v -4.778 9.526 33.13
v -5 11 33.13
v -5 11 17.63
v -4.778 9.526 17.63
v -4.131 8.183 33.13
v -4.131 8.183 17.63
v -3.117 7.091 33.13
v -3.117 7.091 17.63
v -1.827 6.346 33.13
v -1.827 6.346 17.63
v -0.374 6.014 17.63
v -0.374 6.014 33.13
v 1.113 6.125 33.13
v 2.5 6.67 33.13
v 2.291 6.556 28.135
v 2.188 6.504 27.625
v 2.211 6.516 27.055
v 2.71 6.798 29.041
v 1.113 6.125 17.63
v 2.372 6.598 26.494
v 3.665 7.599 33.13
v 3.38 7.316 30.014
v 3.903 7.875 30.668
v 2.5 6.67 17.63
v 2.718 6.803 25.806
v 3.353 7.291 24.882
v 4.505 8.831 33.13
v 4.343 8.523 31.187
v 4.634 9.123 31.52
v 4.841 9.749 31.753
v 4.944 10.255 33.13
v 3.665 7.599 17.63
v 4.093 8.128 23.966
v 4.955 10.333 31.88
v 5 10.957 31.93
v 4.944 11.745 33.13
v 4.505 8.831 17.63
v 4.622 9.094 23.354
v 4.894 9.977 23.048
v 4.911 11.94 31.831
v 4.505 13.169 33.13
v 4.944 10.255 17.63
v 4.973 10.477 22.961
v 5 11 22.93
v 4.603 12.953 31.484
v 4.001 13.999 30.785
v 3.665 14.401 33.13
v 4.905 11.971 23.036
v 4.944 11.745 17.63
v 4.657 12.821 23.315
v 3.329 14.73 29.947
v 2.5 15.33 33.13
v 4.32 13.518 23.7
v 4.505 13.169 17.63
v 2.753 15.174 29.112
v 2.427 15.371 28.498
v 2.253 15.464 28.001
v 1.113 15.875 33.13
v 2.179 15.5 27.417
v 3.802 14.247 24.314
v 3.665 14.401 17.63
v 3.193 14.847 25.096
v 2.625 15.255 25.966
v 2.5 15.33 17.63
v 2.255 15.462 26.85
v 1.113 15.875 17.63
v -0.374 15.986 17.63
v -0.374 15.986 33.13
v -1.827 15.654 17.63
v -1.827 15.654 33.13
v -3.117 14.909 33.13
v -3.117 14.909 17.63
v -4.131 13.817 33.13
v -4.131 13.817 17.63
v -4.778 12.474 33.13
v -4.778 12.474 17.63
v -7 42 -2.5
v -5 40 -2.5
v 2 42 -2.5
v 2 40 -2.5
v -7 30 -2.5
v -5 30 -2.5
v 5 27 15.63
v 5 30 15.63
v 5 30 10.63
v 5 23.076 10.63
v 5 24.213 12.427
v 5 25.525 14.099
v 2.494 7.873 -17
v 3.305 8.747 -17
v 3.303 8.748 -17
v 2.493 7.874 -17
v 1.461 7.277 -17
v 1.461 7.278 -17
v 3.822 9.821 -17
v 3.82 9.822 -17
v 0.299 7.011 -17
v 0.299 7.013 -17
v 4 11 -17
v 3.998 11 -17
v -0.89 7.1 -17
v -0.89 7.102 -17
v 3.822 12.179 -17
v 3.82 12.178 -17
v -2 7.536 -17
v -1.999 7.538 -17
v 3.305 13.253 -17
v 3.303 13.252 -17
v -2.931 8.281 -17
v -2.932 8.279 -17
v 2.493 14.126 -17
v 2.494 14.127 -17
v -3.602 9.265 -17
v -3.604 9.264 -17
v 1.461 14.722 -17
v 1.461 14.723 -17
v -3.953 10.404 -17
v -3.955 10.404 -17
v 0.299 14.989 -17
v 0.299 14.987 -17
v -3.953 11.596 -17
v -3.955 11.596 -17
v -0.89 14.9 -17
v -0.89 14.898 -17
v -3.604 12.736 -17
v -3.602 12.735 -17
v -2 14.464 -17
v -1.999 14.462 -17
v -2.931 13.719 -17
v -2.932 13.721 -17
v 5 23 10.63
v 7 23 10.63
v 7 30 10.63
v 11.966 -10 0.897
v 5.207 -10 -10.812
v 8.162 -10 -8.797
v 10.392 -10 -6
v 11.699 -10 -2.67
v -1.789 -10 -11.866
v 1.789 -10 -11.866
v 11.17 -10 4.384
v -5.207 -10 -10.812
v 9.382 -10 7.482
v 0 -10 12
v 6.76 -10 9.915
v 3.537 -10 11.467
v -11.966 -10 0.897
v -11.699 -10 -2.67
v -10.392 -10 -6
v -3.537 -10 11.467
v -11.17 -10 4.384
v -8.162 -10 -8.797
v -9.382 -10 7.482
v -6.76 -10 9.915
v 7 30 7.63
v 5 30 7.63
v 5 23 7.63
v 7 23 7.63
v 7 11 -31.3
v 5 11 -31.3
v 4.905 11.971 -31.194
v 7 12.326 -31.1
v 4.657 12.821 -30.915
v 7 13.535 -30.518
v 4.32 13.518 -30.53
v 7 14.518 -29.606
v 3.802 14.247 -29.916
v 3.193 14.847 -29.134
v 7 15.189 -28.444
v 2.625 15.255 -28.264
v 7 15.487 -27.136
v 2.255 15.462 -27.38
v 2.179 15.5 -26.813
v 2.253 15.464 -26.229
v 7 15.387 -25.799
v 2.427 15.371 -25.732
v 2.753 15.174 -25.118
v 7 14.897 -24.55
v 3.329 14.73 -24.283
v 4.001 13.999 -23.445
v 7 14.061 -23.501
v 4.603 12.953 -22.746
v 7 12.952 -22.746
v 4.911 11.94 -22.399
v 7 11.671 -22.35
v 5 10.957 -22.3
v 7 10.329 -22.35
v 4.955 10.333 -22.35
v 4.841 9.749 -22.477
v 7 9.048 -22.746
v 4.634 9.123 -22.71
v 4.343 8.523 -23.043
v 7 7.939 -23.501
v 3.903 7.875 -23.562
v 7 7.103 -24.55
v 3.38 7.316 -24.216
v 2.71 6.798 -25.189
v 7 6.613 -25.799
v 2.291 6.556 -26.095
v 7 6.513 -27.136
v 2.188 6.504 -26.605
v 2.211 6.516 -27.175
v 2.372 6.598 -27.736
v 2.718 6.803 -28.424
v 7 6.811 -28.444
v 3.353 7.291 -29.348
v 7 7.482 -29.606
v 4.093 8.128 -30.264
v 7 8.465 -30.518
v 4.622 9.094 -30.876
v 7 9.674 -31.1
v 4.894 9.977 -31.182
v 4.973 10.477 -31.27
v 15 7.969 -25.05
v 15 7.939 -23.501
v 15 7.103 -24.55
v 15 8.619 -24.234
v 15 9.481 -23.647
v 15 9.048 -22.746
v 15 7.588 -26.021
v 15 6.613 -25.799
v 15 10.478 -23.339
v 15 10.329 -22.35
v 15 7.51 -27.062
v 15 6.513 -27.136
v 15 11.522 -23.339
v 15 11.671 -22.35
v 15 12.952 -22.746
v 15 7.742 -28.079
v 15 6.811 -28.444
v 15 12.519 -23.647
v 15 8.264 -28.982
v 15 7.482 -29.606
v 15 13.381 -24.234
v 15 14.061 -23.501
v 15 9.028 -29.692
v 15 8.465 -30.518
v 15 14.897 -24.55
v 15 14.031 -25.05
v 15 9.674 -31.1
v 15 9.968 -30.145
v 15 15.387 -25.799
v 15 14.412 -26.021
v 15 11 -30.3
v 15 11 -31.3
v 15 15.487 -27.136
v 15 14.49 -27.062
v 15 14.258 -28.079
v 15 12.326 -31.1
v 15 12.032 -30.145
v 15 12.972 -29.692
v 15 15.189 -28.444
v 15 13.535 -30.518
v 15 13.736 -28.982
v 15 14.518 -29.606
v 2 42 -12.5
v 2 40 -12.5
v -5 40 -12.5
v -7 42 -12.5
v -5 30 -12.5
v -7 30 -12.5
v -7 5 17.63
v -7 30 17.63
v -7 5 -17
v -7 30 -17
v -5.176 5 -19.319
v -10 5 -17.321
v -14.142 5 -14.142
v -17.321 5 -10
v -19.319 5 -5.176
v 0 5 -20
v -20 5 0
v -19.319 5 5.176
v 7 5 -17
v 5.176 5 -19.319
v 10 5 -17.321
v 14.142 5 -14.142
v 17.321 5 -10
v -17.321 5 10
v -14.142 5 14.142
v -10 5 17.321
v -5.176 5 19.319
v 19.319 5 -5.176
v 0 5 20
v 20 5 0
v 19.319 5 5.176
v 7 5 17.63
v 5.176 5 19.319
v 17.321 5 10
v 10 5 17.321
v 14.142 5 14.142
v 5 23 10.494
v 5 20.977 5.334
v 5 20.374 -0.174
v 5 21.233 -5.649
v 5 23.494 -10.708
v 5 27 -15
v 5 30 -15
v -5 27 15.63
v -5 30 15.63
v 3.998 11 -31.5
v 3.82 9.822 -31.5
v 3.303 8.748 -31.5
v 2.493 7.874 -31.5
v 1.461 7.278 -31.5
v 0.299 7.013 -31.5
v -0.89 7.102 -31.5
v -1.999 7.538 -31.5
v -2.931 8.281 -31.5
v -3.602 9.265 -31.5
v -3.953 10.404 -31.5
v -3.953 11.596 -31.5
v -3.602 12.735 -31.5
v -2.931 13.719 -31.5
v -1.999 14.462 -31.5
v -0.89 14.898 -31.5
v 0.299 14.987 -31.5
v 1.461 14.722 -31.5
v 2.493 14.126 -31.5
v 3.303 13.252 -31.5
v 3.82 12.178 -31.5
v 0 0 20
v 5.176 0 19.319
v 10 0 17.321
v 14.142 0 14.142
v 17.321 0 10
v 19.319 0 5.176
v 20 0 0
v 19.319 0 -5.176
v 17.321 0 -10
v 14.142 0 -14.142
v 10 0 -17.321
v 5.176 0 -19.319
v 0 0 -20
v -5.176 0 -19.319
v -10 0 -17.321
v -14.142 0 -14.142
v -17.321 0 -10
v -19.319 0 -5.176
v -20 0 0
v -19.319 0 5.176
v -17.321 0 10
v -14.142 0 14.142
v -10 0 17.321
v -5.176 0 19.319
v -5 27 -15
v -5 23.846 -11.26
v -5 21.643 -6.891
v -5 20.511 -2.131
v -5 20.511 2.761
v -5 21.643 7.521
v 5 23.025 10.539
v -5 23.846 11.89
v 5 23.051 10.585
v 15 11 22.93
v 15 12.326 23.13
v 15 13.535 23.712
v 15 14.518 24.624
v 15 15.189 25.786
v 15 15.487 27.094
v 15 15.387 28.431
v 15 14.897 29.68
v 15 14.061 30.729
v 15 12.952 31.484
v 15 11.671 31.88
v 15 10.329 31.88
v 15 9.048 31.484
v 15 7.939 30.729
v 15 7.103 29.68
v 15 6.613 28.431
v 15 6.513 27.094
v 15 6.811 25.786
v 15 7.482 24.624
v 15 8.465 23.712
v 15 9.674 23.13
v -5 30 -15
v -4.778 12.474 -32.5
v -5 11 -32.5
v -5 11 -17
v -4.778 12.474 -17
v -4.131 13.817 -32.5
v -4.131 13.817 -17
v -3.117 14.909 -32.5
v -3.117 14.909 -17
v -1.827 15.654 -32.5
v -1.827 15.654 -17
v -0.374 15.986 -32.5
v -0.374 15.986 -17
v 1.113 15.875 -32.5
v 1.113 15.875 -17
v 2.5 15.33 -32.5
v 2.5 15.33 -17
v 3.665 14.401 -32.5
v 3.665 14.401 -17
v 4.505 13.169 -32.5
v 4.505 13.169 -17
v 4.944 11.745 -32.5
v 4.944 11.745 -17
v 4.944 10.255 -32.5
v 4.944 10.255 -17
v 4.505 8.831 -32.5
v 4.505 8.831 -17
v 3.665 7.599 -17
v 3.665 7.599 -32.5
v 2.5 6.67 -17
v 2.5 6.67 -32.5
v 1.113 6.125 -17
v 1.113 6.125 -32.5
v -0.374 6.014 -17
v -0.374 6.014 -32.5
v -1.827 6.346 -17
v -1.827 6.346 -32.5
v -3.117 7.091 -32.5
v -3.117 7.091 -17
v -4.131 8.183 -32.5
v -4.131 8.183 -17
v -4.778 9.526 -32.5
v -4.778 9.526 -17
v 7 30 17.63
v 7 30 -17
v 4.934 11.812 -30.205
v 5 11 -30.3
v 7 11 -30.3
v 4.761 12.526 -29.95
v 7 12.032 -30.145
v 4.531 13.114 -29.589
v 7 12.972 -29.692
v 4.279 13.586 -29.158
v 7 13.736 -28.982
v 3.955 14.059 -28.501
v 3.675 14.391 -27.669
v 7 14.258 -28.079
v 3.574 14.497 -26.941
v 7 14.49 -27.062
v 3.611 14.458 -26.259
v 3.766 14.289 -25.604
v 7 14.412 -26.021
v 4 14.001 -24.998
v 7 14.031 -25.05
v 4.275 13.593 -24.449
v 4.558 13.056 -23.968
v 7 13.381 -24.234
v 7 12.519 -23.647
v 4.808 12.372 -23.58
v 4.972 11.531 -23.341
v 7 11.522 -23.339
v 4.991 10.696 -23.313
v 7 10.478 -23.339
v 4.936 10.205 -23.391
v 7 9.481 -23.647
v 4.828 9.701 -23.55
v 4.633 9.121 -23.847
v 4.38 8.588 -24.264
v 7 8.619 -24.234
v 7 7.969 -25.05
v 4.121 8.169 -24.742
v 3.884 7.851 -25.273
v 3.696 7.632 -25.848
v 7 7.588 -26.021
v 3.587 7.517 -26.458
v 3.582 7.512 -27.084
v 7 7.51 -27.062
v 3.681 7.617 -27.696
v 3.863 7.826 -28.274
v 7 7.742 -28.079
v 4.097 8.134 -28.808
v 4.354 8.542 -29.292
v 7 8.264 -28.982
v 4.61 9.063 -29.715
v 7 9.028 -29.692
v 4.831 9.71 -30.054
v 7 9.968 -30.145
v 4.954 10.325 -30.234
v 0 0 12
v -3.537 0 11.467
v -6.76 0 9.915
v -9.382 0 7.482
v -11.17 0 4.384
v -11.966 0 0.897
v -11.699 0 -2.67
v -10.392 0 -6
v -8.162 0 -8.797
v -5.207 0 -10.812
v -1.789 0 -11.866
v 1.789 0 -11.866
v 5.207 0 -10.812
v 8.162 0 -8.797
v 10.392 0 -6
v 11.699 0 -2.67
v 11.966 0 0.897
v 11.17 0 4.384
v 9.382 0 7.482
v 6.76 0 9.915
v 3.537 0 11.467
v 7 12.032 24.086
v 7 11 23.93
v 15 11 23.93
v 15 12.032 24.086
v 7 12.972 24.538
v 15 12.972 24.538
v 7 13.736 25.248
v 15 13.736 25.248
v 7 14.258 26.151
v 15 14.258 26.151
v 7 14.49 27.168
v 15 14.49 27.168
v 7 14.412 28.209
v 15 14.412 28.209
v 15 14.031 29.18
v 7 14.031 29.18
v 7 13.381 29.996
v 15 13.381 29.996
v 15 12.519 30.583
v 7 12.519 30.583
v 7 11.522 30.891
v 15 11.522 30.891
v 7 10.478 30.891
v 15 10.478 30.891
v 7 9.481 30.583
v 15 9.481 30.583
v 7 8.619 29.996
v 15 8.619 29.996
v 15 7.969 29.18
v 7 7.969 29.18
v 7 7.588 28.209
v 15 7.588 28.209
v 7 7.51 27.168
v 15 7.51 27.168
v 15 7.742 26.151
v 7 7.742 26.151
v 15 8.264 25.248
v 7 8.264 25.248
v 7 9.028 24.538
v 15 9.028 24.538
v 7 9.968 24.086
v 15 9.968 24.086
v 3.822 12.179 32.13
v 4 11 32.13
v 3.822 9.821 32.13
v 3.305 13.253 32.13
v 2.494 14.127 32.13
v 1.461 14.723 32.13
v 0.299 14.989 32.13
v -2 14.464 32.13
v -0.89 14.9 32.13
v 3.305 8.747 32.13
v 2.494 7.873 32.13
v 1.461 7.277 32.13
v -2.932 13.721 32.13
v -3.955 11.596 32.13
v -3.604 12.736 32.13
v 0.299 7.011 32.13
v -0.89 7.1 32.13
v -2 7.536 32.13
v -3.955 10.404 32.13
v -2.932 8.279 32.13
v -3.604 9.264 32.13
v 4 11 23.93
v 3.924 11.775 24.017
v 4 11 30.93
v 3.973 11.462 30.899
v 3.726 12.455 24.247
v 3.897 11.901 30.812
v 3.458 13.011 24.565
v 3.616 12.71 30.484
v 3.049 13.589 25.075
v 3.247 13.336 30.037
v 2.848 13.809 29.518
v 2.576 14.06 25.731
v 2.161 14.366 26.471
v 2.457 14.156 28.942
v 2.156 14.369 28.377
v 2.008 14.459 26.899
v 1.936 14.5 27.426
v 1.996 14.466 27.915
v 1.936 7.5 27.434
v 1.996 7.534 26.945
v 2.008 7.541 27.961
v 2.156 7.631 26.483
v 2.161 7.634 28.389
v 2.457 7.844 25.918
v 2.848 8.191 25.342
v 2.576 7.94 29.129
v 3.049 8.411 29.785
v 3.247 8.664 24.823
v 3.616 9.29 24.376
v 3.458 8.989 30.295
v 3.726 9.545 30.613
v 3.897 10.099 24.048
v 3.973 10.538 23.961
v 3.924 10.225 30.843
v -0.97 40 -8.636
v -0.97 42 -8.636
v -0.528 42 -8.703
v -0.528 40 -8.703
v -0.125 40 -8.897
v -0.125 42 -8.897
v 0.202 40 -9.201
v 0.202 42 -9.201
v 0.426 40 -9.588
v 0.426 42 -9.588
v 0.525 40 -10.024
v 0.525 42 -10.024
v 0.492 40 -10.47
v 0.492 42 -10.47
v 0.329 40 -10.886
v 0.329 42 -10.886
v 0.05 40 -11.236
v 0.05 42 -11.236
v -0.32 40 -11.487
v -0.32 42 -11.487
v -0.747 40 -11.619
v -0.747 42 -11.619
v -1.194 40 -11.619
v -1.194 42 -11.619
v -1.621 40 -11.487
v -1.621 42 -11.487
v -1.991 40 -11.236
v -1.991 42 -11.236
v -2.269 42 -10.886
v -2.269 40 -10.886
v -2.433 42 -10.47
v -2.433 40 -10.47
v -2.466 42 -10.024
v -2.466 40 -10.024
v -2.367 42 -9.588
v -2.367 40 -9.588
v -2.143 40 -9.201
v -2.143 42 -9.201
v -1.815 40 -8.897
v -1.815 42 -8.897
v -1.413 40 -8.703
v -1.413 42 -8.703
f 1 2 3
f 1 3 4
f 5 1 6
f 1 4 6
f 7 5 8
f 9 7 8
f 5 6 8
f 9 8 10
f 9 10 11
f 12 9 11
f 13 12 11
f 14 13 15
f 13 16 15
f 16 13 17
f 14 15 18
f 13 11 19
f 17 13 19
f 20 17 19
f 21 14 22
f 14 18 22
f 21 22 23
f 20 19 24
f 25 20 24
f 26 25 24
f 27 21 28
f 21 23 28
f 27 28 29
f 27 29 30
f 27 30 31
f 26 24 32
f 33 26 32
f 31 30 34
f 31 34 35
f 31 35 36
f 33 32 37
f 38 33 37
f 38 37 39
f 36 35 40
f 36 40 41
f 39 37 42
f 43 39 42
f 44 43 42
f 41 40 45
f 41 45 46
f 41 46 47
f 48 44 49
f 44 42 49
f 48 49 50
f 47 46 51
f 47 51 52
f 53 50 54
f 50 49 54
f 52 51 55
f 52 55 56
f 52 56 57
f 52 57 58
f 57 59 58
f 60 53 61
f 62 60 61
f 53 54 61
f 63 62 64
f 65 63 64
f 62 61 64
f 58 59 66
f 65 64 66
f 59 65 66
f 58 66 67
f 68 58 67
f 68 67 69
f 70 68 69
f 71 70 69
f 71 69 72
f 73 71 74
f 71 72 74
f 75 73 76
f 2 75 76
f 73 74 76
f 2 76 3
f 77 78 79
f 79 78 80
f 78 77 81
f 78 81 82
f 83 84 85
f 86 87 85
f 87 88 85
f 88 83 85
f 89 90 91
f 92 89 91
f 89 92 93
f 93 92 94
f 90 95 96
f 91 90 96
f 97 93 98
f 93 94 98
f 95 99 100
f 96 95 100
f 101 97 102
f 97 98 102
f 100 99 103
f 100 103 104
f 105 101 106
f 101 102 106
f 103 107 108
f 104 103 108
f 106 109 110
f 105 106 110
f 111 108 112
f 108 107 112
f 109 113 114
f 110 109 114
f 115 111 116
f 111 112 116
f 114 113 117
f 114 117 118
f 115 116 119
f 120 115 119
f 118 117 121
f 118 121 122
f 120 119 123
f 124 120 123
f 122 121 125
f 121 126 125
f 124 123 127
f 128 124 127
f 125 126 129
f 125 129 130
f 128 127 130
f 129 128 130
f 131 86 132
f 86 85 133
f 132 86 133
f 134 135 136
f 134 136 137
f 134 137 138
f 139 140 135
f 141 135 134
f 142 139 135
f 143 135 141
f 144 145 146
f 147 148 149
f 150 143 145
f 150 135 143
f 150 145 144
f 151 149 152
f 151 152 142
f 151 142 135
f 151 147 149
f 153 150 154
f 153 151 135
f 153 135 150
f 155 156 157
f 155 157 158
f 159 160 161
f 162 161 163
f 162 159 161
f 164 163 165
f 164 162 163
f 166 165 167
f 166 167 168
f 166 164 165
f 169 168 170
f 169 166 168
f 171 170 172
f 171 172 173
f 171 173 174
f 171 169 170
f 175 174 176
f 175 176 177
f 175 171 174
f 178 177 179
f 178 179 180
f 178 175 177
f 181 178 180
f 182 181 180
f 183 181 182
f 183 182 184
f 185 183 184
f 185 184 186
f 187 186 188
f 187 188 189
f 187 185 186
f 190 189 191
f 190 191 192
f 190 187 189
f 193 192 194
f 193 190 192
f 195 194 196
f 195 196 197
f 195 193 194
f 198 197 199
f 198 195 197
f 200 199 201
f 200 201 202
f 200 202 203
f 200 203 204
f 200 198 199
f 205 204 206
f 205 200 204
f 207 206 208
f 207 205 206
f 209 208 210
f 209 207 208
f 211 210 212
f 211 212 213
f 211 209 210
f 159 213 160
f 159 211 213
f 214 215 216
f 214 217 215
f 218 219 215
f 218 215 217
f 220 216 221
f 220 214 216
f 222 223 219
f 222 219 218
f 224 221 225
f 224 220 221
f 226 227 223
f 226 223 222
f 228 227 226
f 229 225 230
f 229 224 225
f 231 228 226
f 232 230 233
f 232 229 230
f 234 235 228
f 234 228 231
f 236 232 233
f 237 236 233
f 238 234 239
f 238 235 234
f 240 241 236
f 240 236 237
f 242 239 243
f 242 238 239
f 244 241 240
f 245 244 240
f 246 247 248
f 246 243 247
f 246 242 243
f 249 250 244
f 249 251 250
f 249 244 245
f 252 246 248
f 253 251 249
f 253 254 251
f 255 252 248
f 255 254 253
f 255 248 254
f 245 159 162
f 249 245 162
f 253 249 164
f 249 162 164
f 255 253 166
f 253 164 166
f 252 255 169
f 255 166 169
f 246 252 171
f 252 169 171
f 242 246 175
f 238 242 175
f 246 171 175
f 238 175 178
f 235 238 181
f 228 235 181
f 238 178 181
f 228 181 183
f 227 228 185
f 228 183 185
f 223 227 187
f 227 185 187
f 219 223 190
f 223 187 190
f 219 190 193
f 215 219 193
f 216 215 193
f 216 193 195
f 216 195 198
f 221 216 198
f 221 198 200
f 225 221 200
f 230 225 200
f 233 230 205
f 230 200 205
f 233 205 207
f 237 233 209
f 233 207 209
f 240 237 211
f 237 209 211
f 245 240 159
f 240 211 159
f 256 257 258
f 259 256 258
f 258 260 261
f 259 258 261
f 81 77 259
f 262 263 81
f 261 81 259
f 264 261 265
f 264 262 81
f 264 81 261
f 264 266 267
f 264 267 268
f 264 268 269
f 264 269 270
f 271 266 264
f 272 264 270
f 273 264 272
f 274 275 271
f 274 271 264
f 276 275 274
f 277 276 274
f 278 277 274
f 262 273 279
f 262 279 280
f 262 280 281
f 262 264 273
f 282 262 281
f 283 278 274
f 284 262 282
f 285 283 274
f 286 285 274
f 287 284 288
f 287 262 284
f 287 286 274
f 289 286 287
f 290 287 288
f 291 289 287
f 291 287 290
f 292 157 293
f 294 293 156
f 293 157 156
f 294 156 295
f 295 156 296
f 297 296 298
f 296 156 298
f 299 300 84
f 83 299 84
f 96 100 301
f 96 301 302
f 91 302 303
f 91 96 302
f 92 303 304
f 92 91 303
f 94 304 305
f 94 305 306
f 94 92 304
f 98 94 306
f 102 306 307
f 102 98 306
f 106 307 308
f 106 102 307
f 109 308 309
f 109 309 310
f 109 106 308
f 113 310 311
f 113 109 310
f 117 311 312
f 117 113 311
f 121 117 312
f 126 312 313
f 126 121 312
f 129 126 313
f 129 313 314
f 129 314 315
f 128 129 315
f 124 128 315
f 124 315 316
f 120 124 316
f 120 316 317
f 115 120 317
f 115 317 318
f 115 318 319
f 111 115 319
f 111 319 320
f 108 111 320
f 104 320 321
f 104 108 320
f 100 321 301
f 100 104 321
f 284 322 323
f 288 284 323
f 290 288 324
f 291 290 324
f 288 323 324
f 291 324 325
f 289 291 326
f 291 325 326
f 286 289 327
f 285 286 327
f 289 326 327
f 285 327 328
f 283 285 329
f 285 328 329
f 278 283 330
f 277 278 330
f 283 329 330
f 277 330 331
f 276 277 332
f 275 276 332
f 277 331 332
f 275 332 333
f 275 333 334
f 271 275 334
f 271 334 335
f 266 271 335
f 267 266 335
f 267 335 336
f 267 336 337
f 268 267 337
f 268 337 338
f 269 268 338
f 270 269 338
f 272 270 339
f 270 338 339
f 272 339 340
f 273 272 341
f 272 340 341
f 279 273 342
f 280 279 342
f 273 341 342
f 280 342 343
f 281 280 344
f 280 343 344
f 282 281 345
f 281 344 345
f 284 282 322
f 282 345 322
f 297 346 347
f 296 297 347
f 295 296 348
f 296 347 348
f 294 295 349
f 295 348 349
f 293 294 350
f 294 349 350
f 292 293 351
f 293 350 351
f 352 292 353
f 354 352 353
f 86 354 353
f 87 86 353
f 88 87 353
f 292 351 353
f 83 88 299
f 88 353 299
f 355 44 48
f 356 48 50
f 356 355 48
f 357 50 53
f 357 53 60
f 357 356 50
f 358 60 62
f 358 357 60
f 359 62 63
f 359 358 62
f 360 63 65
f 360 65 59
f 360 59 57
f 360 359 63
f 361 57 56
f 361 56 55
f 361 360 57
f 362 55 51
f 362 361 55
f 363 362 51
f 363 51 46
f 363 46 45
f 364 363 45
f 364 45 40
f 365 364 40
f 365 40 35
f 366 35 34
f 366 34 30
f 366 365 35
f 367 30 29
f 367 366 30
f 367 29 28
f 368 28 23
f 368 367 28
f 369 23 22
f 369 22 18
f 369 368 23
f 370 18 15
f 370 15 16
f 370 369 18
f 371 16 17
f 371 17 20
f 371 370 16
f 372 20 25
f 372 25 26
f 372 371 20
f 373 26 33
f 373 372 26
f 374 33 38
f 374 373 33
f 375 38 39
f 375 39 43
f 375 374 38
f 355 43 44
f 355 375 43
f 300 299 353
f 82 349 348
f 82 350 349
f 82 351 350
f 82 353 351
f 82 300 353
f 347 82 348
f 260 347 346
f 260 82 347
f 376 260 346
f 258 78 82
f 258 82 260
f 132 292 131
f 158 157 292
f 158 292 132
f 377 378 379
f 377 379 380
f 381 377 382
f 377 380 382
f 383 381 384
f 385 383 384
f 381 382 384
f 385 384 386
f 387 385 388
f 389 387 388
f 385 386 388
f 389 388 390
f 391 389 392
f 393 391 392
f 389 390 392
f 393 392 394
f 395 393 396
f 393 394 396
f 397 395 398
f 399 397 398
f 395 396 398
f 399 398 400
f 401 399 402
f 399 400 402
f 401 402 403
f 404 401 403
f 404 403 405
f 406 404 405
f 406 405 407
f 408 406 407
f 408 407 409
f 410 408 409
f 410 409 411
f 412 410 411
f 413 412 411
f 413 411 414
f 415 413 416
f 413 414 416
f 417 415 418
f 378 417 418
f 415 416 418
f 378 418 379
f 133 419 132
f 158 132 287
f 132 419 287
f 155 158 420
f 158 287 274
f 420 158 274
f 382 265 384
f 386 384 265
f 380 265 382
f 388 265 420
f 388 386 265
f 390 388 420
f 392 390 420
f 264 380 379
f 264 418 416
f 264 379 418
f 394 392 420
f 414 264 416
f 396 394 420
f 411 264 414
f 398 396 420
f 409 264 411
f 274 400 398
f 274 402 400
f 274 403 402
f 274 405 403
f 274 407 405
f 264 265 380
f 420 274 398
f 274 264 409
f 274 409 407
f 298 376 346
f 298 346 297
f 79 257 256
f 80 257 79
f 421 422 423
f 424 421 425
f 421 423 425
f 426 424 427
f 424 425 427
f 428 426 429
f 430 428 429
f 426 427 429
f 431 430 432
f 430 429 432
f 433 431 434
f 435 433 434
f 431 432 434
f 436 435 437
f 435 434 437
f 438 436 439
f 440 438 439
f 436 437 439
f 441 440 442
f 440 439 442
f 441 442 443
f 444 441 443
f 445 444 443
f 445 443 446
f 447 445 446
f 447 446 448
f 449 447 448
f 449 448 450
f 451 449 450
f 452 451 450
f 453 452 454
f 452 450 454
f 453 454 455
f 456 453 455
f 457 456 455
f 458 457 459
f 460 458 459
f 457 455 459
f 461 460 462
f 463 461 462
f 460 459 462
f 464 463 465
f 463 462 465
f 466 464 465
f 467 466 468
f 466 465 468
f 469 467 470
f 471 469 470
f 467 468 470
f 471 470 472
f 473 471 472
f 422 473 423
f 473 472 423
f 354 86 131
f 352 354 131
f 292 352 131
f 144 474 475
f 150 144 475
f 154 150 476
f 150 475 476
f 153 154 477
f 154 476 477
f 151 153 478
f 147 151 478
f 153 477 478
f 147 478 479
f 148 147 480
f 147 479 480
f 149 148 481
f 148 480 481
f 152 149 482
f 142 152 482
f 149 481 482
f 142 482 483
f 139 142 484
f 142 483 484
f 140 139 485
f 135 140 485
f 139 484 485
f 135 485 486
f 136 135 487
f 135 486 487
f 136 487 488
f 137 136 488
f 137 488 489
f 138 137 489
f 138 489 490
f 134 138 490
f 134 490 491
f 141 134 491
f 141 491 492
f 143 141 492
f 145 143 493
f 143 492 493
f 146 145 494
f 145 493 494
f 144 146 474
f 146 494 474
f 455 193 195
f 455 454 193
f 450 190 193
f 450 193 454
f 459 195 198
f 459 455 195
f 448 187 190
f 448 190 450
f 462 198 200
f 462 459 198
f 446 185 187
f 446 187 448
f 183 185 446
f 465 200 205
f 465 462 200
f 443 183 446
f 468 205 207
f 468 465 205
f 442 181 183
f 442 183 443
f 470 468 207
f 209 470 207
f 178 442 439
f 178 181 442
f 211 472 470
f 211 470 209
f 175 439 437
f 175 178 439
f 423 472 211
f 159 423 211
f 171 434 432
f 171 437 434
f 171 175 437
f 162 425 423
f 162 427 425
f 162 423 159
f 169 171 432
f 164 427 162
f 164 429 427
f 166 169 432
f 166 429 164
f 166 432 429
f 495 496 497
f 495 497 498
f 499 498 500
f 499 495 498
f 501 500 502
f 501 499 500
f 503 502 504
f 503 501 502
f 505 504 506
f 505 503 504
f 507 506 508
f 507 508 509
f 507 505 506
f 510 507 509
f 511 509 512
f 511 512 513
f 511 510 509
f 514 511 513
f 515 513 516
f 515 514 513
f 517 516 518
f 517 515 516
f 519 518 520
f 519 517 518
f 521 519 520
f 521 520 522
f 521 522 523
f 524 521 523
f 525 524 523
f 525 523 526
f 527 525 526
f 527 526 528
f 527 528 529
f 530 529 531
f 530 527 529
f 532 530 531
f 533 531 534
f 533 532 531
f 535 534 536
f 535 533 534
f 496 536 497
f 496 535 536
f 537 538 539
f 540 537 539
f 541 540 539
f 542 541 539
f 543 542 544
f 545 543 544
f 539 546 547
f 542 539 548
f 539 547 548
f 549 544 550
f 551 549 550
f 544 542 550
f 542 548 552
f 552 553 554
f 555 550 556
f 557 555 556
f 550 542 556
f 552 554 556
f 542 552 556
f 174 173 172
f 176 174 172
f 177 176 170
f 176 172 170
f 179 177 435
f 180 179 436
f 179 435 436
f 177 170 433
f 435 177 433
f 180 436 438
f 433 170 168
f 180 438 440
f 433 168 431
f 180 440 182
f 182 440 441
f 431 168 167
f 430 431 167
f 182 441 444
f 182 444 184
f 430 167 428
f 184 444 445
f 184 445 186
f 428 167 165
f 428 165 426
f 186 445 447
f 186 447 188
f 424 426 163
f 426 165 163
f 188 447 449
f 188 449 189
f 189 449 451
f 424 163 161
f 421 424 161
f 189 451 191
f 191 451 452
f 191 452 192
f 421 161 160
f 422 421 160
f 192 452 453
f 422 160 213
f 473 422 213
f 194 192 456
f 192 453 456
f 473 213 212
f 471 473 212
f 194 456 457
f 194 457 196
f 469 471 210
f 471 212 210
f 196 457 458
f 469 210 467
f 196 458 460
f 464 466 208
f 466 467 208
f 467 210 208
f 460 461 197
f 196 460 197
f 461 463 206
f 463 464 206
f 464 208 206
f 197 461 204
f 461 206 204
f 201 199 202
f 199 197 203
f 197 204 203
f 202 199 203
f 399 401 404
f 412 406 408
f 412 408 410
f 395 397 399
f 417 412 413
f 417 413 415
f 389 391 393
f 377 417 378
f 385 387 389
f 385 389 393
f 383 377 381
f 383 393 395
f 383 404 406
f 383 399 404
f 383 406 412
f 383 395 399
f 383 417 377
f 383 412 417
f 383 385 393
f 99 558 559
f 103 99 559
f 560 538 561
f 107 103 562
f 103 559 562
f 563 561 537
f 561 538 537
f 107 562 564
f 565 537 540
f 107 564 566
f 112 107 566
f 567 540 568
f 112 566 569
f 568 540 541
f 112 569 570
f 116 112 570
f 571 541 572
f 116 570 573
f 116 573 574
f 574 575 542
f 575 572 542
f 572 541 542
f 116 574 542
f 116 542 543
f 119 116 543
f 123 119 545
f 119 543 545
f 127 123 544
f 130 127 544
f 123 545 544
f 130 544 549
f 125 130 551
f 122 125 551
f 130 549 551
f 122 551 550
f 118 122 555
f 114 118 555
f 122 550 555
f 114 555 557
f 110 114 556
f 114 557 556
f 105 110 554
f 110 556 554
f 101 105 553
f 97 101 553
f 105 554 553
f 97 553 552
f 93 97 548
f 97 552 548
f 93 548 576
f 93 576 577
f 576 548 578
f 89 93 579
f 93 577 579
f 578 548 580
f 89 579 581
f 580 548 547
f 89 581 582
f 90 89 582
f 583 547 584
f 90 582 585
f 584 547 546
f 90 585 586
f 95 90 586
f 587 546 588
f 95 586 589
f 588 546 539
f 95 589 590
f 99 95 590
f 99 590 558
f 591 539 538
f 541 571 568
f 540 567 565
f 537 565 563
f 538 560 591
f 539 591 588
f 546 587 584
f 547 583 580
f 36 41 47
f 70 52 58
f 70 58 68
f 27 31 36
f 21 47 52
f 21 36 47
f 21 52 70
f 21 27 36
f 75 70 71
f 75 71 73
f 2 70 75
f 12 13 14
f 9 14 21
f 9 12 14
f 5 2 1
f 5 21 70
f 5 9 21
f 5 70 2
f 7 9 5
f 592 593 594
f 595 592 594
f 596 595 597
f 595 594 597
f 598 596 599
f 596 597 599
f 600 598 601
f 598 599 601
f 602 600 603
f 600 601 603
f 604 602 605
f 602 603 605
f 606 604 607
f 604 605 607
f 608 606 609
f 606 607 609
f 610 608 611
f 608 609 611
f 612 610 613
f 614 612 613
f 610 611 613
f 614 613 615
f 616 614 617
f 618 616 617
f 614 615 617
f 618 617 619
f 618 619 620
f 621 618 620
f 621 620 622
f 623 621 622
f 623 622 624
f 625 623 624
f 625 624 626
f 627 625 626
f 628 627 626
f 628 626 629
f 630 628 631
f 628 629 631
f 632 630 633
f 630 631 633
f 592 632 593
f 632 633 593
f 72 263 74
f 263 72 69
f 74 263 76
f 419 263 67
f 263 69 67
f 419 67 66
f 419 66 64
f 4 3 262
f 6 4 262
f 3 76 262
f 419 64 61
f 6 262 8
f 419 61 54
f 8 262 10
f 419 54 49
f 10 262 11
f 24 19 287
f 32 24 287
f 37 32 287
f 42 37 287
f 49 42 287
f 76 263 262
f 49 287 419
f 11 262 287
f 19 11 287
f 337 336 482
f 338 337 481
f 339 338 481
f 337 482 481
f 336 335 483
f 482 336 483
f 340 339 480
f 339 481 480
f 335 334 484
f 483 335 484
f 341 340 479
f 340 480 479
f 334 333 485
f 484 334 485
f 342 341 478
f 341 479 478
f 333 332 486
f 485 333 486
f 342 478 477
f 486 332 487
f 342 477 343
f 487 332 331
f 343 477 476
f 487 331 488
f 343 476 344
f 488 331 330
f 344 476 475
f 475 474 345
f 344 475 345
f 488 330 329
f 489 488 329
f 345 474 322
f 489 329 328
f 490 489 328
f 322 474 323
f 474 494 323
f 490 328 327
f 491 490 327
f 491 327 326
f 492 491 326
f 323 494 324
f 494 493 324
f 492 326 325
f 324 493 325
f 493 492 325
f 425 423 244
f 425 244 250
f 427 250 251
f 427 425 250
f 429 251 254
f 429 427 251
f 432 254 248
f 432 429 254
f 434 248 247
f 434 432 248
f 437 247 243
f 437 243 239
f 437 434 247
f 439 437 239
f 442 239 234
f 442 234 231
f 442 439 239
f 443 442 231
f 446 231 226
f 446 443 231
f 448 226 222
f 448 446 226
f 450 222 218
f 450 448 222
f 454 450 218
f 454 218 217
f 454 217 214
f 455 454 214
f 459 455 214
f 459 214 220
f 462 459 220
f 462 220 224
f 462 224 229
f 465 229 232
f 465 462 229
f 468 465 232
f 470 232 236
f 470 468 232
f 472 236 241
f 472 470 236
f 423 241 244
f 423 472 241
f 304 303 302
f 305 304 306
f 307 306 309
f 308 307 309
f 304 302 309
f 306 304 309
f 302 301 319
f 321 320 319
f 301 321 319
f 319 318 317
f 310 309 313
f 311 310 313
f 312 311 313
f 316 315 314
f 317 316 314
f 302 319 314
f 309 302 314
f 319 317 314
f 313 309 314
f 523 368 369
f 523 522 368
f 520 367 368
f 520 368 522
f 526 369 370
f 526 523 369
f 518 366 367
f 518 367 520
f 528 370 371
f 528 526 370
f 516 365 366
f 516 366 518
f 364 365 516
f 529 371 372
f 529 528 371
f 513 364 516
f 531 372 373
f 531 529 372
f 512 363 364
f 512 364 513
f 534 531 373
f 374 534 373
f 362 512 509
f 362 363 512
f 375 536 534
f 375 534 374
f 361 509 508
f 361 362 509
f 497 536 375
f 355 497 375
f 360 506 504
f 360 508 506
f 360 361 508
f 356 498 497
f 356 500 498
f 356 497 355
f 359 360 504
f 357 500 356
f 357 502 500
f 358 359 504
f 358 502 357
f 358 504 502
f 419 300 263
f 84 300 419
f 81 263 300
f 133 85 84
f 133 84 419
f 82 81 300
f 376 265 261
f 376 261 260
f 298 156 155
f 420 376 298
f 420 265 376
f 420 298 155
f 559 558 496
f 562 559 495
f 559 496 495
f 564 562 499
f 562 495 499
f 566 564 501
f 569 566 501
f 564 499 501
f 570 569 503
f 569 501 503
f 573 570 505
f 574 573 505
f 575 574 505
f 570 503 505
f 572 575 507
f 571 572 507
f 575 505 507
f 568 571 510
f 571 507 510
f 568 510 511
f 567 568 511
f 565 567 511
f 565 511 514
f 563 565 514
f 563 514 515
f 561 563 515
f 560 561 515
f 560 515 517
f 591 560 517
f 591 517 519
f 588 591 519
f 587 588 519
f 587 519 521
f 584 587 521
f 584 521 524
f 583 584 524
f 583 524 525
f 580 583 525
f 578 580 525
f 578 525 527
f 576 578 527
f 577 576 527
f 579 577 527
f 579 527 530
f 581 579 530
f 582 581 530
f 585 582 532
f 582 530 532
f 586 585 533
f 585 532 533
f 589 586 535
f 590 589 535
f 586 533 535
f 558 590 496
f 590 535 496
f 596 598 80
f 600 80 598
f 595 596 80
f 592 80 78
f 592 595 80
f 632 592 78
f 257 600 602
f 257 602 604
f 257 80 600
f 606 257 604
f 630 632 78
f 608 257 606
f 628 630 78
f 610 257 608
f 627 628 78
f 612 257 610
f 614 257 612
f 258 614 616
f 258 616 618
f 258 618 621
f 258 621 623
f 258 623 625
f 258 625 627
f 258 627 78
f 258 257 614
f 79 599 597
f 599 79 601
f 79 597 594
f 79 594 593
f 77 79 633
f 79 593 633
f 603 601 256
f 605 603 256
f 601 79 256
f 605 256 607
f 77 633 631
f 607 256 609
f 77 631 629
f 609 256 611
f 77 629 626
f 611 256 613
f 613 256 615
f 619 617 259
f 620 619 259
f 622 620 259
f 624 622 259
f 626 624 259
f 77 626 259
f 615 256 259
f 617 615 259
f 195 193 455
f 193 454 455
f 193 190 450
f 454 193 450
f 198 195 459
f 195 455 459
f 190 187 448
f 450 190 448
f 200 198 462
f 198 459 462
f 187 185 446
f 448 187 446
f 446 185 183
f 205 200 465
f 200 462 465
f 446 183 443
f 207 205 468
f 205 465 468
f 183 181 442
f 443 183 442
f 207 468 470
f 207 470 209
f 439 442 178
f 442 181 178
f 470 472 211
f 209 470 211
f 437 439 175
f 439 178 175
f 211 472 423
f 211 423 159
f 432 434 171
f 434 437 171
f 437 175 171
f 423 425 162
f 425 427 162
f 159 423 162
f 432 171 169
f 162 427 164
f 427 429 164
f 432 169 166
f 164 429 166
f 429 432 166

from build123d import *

# Parameters (mm, degrees)
SKETCH_1_R               = 20
EXTRUDE_1_DEPTH          = 5
SKETCH_2_W               = 14
SKETCH_2_H               = 34.630049735
EXTRUDE_2_DEPTH          = 25
SKETCH_3_W               = 10
SKETCH_3_H               = 30.630049735
CUT_EXTRUDE_1_DEPTH      = 3
CUT_EXTRUDE_2_DEPTH      = 10
SKETCH_5_W               = 2
SKETCH_5_H               = 3
CUT_EXTRUDE_3_DEPTH      = 7
SKETCH_6_W               = 2
SKETCH_6_H               = 10
EXTRUDE_3_DEPTH          = 10
EXTRUDE_4_DEPTH          = 2
SKETCH_8_R               = 1.5
CUT_EXTRUDE_4_DEPTH      = 2
SKETCH_9_R               = 4
CUT_EXTRUDE_5_DEPTH      = 35
EXTRUDE_START            = 14.5
SKETCH_10_R              = 5
SKETCH_10_R_2            = 4
EXTRUDE_5_DEPTH          = 14.5
EXTRUDE_6_REACH          = 61.375
EXTRUDE_6_END_RADIUS     = 5
SKETCH_11_R              = 4.5
CUT_EXTRUDE_6_REACH      = 61.375
CUT_EXTRUDE_6_END_RADIUS = 4
SKETCH_12_R              = 3.5
SKETCH_13_R              = 5
EXTRUDE_7_DEPTH          = 1
SKETCH_14_R              = 4.5
SKETCH_14_R_2            = 3.5
EXTRUDE_8_DEPTH          = 8
SKETCH_15_R              = 5
SKETCH_15_R_2            = 3.998003616
EXTRUDE_9_DEPTH          = 14.5
SKETCH_16_R              = 5
EXTRUDE_11_DEPTH         = 1
CUT_EXTRUDE_7_REACH      = 61.922
CUT_EXTRUDE_7_END_RADIUS = 5
SKETCH_17_R              = 3.5
SKETCH_19_R              = 12
EXTRUDE_12_DEPTH         = 10


with BuildPart() as part:
    # Эскиз1 → Бобышка-Вытянуть1 (new body)
    with BuildSketch(Plane(origin=(0, 0, 0), x_dir=(1, 0, 0), z_dir=(0, 1, 0))):
        with Locations(Location((0, 0, 0), (0, 0, 270))):
            Circle(SKETCH_1_R)
    extrude(amount=EXTRUDE_1_DEPTH)

    # Эскиз2 → Бобышка-Вытянуть2 (add)
    with BuildSketch(Plane(origin=(0, 5, 0), x_dir=(1, 0, 0), z_dir=(0, 1, 0))):
        with Locations((0, -0.315024868)):
            Rectangle(SKETCH_2_W, SKETCH_2_H)
    extrude(amount=EXTRUDE_2_DEPTH)

    # Эскиз3 → Вырез-Вытянуть1 (cut)
    with BuildSketch(Plane(origin=(0, 30, 0), x_dir=(1, 0, 0), z_dir=(0, 1, 0))):
        with Locations((0, -0.315024868)):
            Rectangle(SKETCH_3_W, SKETCH_3_H)
    extrude(amount=-CUT_EXTRUDE_1_DEPTH, mode=Mode.SUBTRACT)

    # Эскиз4 → Вырез-Вытянуть2 (cut)
    with BuildSketch(Plane(origin=(-5, 0, 0), x_dir=(0, 0, -1), z_dir=(1, 0, 0))):
        with BuildLine():
            Line((-15.630049735, 27), (15, 27))
            ThreePointArc((15, 27), (-0.315024867, 20.368368499), (-15.630049735, 27))
        make_face()
    extrude(amount=CUT_EXTRUDE_2_DEPTH, mode=Mode.SUBTRACT)

    # Эскиз5 → Вырез-Вытянуть3 (cut)
    with BuildSketch(Plane(origin=(0, 30, 0), x_dir=(1, 0, 0), z_dir=(0, 1, 0))):
        with Locations((6, -9.130049735)):
            Rectangle(SKETCH_5_W, SKETCH_5_H)
    extrude(amount=-CUT_EXTRUDE_3_DEPTH, mode=Mode.SUBTRACT)

    # Эскиз6 → Бобышка-Вытянуть3 (add)
    with BuildSketch(Plane(origin=(0, 30, 0), x_dir=(1, 0, 0), z_dir=(0, 1, 0))):
        with Locations((-6, 7.5)):
            Rectangle(SKETCH_6_W, SKETCH_6_H)
    extrude(amount=EXTRUDE_3_DEPTH)

    # Эскиз7 → Бобышка-Вытянуть4 (add)
    with BuildSketch(Plane(origin=(0, 40, 0), x_dir=(1, 0, 0), z_dir=(0, 1, 0))):
        Polygon((-7, 12.5), (-5, 12.5), (2, 12.5), (2, 2.5), (-5, 2.5), (-7, 2.5), align=None)
    extrude(amount=EXTRUDE_4_DEPTH)

    # Эскиз8 → Вырез-Вытянуть4 (cut)
    with BuildSketch(Plane(origin=(0, 42, 0), x_dir=(1, 0, 0), z_dir=(0, 1, 0))):
        with Locations(Location((-0.97037305, 10.13600386, 0), (0, 0, 270))):
            Circle(SKETCH_8_R)
    extrude(amount=-CUT_EXTRUDE_4_DEPTH, mode=Mode.SUBTRACT)

    # Эскиз9 → Вырез-Вытянуть5 (cut)
    with BuildSketch(Plane.XY.offset(17.630049735)):
        with Locations((0, 11)):
            Circle(SKETCH_9_R)
    extrude(amount=-CUT_EXTRUDE_5_DEPTH, mode=Mode.SUBTRACT)

    # Эскиз10 → Бобышка-Вытянуть5 (add)
    with BuildSketch(Plane.XY.offset(17.630049735).offset(EXTRUDE_START)):
        with Locations(Location((0, 11, 0), (0, 0, 180))):
            Circle(SKETCH_10_R)
        with Locations((0, 11)):
            Circle(SKETCH_10_R_2, mode=Mode.SUBTRACT)
    extrude(amount=-EXTRUDE_5_DEPTH)

    # Бобышка-Вытянуть6: up to this cylinder (the profile starts outside it)
    extrude_6_end = Plane(origin=(0, 11, 0.315025), z_dir=(0, 0, -1)) * Cylinder(EXTRUDE_6_END_RADIUS, 187.98005, mode=Mode.PRIVATE)
    # Эскиз11 → Бобышка-Вытянуть6 (add, up to the surface)
    with BuildSketch(Plane(origin=(7, 0, 0), x_dir=(0, 0, -1), z_dir=(1, 0, 0)), mode=Mode.PRIVATE) as extrude_6_sk1:
        with Locations((-27.430049735, 11)):
            Circle(SKETCH_11_R)
    extrude_6_tool1 = extrude(extrude_6_sk1.sketch, amount=-EXTRUDE_6_REACH, mode=Mode.PRIVATE) - extrude_6_end
    add(extrude_6_tool1.solids().sort_by_distance((7, 11, 27.43005))[0])
    # Эскиз11 → Бобышка-Вытянуть6 (add, up to the surface)
    with BuildSketch(Plane(origin=(7, 0, 0), x_dir=(0, 0, -1), z_dir=(1, 0, 0)), mode=Mode.PRIVATE) as extrude_6_sk2:
        with Locations((26.8, 11)):
            Circle(SKETCH_11_R)
    extrude_6_tool2 = extrude(extrude_6_sk2.sketch, amount=-EXTRUDE_6_REACH, mode=Mode.PRIVATE) - extrude_6_end
    add(extrude_6_tool2.solids().sort_by_distance((7, 11, -26.8))[0])


with BuildPart() as extrude_6_piece_1:
    # of the separate pieces the step leaves, piece 1, a body of its own (extrude_6_pieces)
    add(part.part.solids().sort_by_distance((0, 0, 20))[0])

    # Вырез-Вытянуть6: up to this cylinder (the profile starts outside it)
    cut_extrude_6_end = Plane(origin=(0, 11, 27.43005), z_dir=(0, 0, 1)) * Cylinder(CUT_EXTRUDE_6_END_RADIUS, 131.75, mode=Mode.PRIVATE)
    # Эскиз12 → Вырез-Вытянуть6 (cut, up to the surface)
    with BuildSketch(Plane(origin=(7, 0, 0), x_dir=(0, 0, -1), z_dir=(1, 0, 0)), mode=Mode.PRIVATE) as cut_extrude_6_sk1:
        with Locations((-27.430049735, 11)):
            Circle(SKETCH_12_R)
    cut_extrude_6_tool1 = extrude(cut_extrude_6_sk1.sketch, amount=-CUT_EXTRUDE_6_REACH, mode=Mode.PRIVATE) - cut_extrude_6_end
    add(cut_extrude_6_tool1.solids().sort_by_distance((7, 11, 27.43005))[0], mode=Mode.SUBTRACT)

    # Эскиз13 → Бобышка-Вытянуть7 (add)
    with BuildSketch(Plane.XY.offset(32.130049735)):
        with Locations(Location((0, 11, 0), (0, 0, 180))):
            Circle(SKETCH_13_R)
    extrude(amount=EXTRUDE_7_DEPTH)

    # Эскиз14 → Бобышка-Вытянуть8 (add)
    # profile 1 of 2: a face of its own
    with BuildSketch(Plane(origin=(7, 0, 0), x_dir=(0, 0, -1), z_dir=(1, 0, 0))):
        with Locations((-27.430049735, 11)):
            Circle(SKETCH_14_R)
        with Locations((-27.430049735, 11)):
            Circle(SKETCH_14_R_2, mode=Mode.SUBTRACT)
    # profile 2 of 2: a face of its own
    with BuildSketch(Plane(origin=(7, 0, 0), x_dir=(0, 0, -1), z_dir=(1, 0, 0))):
        with Locations((26.8, 11)):
            Circle(SKETCH_14_R)
        with Locations((26.8, 11)):
            Circle(SKETCH_14_R_2, mode=Mode.SUBTRACT)
    extrude(amount=EXTRUDE_8_DEPTH)


with BuildPart() as extrude_6_piece_2:
    # of the separate pieces the step leaves, piece 2, a body of its own (extrude_6_pieces)
    add(part.part.solids().sort_by_distance((5, 11, -31.3))[0])

    # Вырез-Вытянуть7: up to this cylinder (the profile starts outside it)
    cut_extrude_7_end = Plane(origin=(0, 11, -26.8), z_dir=(0, 0, -1)) * Cylinder(CUT_EXTRUDE_7_END_RADIUS, 134.844, mode=Mode.PRIVATE)
    # Эскиз17 → Вырез-Вытянуть7 (cut, up to the surface)
    with BuildSketch(Plane(origin=(7, 0, 0), x_dir=(0, 0, -1), z_dir=(1, 0, 0)), mode=Mode.PRIVATE) as cut_extrude_7_sk1:
        with Locations((26.8, 11)):
            Circle(SKETCH_17_R)
    cut_extrude_7_tool1 = extrude(cut_extrude_7_sk1.sketch, amount=-CUT_EXTRUDE_7_REACH, mode=Mode.PRIVATE) - cut_extrude_7_end
    add(cut_extrude_7_tool1.solids().sort_by_distance((7, 11, -26.8))[0], mode=Mode.SUBTRACT)


with BuildPart() as extrude_8_piece_1:
    # of the separate pieces the step leaves, piece 1, a body of its own (extrude_8_pieces)
    add(extrude_6_piece_1.part.solids().sort_by_distance((0, 0, 20))[0])

    # Эскиз15 → Бобышка-Вытянуть9 (add)
    with BuildSketch(Plane(origin=(0, 0, -17), x_dir=(-1, 0, 0), z_dir=(0, 0, -1))):
        with Locations((0, 11)):
            Circle(SKETCH_15_R)
        with Locations(Location((0, 11, 0), (0, 0, 180))):
            Circle(SKETCH_15_R_2, mode=Mode.SUBTRACT)
    extrude(amount=EXTRUDE_9_DEPTH)

    # Эскиз16 → Бобышка-Вытянуть11 (add)
    with BuildSketch(Plane(origin=(0, 0, -31.5), x_dir=(-1, 0, 0), z_dir=(0, 0, -1))):
        with Locations((0, 11)):
            Circle(SKETCH_16_R)
    extrude(amount=EXTRUDE_11_DEPTH)

    # Эскиз19 → Бобышка-Вытянуть12 (add)
    with BuildSketch(Plane.XZ):
        with Locations(Location((0, 0, 0), (0, 0, 90))):
            Circle(SKETCH_19_R)
    extrude(amount=EXTRUDE_12_DEPTH)


with BuildPart() as extrude_8_piece_2:
    # of the separate pieces the step leaves, piece 2, a body of its own (extrude_8_pieces)
    add(extrude_6_piece_1.part.solids().sort_by_distance((7, 11, -31.3))[0])


solid = Compound([extrude_6_piece_2.part, extrude_8_piece_1.part, extrude_8_piece_2.part])
